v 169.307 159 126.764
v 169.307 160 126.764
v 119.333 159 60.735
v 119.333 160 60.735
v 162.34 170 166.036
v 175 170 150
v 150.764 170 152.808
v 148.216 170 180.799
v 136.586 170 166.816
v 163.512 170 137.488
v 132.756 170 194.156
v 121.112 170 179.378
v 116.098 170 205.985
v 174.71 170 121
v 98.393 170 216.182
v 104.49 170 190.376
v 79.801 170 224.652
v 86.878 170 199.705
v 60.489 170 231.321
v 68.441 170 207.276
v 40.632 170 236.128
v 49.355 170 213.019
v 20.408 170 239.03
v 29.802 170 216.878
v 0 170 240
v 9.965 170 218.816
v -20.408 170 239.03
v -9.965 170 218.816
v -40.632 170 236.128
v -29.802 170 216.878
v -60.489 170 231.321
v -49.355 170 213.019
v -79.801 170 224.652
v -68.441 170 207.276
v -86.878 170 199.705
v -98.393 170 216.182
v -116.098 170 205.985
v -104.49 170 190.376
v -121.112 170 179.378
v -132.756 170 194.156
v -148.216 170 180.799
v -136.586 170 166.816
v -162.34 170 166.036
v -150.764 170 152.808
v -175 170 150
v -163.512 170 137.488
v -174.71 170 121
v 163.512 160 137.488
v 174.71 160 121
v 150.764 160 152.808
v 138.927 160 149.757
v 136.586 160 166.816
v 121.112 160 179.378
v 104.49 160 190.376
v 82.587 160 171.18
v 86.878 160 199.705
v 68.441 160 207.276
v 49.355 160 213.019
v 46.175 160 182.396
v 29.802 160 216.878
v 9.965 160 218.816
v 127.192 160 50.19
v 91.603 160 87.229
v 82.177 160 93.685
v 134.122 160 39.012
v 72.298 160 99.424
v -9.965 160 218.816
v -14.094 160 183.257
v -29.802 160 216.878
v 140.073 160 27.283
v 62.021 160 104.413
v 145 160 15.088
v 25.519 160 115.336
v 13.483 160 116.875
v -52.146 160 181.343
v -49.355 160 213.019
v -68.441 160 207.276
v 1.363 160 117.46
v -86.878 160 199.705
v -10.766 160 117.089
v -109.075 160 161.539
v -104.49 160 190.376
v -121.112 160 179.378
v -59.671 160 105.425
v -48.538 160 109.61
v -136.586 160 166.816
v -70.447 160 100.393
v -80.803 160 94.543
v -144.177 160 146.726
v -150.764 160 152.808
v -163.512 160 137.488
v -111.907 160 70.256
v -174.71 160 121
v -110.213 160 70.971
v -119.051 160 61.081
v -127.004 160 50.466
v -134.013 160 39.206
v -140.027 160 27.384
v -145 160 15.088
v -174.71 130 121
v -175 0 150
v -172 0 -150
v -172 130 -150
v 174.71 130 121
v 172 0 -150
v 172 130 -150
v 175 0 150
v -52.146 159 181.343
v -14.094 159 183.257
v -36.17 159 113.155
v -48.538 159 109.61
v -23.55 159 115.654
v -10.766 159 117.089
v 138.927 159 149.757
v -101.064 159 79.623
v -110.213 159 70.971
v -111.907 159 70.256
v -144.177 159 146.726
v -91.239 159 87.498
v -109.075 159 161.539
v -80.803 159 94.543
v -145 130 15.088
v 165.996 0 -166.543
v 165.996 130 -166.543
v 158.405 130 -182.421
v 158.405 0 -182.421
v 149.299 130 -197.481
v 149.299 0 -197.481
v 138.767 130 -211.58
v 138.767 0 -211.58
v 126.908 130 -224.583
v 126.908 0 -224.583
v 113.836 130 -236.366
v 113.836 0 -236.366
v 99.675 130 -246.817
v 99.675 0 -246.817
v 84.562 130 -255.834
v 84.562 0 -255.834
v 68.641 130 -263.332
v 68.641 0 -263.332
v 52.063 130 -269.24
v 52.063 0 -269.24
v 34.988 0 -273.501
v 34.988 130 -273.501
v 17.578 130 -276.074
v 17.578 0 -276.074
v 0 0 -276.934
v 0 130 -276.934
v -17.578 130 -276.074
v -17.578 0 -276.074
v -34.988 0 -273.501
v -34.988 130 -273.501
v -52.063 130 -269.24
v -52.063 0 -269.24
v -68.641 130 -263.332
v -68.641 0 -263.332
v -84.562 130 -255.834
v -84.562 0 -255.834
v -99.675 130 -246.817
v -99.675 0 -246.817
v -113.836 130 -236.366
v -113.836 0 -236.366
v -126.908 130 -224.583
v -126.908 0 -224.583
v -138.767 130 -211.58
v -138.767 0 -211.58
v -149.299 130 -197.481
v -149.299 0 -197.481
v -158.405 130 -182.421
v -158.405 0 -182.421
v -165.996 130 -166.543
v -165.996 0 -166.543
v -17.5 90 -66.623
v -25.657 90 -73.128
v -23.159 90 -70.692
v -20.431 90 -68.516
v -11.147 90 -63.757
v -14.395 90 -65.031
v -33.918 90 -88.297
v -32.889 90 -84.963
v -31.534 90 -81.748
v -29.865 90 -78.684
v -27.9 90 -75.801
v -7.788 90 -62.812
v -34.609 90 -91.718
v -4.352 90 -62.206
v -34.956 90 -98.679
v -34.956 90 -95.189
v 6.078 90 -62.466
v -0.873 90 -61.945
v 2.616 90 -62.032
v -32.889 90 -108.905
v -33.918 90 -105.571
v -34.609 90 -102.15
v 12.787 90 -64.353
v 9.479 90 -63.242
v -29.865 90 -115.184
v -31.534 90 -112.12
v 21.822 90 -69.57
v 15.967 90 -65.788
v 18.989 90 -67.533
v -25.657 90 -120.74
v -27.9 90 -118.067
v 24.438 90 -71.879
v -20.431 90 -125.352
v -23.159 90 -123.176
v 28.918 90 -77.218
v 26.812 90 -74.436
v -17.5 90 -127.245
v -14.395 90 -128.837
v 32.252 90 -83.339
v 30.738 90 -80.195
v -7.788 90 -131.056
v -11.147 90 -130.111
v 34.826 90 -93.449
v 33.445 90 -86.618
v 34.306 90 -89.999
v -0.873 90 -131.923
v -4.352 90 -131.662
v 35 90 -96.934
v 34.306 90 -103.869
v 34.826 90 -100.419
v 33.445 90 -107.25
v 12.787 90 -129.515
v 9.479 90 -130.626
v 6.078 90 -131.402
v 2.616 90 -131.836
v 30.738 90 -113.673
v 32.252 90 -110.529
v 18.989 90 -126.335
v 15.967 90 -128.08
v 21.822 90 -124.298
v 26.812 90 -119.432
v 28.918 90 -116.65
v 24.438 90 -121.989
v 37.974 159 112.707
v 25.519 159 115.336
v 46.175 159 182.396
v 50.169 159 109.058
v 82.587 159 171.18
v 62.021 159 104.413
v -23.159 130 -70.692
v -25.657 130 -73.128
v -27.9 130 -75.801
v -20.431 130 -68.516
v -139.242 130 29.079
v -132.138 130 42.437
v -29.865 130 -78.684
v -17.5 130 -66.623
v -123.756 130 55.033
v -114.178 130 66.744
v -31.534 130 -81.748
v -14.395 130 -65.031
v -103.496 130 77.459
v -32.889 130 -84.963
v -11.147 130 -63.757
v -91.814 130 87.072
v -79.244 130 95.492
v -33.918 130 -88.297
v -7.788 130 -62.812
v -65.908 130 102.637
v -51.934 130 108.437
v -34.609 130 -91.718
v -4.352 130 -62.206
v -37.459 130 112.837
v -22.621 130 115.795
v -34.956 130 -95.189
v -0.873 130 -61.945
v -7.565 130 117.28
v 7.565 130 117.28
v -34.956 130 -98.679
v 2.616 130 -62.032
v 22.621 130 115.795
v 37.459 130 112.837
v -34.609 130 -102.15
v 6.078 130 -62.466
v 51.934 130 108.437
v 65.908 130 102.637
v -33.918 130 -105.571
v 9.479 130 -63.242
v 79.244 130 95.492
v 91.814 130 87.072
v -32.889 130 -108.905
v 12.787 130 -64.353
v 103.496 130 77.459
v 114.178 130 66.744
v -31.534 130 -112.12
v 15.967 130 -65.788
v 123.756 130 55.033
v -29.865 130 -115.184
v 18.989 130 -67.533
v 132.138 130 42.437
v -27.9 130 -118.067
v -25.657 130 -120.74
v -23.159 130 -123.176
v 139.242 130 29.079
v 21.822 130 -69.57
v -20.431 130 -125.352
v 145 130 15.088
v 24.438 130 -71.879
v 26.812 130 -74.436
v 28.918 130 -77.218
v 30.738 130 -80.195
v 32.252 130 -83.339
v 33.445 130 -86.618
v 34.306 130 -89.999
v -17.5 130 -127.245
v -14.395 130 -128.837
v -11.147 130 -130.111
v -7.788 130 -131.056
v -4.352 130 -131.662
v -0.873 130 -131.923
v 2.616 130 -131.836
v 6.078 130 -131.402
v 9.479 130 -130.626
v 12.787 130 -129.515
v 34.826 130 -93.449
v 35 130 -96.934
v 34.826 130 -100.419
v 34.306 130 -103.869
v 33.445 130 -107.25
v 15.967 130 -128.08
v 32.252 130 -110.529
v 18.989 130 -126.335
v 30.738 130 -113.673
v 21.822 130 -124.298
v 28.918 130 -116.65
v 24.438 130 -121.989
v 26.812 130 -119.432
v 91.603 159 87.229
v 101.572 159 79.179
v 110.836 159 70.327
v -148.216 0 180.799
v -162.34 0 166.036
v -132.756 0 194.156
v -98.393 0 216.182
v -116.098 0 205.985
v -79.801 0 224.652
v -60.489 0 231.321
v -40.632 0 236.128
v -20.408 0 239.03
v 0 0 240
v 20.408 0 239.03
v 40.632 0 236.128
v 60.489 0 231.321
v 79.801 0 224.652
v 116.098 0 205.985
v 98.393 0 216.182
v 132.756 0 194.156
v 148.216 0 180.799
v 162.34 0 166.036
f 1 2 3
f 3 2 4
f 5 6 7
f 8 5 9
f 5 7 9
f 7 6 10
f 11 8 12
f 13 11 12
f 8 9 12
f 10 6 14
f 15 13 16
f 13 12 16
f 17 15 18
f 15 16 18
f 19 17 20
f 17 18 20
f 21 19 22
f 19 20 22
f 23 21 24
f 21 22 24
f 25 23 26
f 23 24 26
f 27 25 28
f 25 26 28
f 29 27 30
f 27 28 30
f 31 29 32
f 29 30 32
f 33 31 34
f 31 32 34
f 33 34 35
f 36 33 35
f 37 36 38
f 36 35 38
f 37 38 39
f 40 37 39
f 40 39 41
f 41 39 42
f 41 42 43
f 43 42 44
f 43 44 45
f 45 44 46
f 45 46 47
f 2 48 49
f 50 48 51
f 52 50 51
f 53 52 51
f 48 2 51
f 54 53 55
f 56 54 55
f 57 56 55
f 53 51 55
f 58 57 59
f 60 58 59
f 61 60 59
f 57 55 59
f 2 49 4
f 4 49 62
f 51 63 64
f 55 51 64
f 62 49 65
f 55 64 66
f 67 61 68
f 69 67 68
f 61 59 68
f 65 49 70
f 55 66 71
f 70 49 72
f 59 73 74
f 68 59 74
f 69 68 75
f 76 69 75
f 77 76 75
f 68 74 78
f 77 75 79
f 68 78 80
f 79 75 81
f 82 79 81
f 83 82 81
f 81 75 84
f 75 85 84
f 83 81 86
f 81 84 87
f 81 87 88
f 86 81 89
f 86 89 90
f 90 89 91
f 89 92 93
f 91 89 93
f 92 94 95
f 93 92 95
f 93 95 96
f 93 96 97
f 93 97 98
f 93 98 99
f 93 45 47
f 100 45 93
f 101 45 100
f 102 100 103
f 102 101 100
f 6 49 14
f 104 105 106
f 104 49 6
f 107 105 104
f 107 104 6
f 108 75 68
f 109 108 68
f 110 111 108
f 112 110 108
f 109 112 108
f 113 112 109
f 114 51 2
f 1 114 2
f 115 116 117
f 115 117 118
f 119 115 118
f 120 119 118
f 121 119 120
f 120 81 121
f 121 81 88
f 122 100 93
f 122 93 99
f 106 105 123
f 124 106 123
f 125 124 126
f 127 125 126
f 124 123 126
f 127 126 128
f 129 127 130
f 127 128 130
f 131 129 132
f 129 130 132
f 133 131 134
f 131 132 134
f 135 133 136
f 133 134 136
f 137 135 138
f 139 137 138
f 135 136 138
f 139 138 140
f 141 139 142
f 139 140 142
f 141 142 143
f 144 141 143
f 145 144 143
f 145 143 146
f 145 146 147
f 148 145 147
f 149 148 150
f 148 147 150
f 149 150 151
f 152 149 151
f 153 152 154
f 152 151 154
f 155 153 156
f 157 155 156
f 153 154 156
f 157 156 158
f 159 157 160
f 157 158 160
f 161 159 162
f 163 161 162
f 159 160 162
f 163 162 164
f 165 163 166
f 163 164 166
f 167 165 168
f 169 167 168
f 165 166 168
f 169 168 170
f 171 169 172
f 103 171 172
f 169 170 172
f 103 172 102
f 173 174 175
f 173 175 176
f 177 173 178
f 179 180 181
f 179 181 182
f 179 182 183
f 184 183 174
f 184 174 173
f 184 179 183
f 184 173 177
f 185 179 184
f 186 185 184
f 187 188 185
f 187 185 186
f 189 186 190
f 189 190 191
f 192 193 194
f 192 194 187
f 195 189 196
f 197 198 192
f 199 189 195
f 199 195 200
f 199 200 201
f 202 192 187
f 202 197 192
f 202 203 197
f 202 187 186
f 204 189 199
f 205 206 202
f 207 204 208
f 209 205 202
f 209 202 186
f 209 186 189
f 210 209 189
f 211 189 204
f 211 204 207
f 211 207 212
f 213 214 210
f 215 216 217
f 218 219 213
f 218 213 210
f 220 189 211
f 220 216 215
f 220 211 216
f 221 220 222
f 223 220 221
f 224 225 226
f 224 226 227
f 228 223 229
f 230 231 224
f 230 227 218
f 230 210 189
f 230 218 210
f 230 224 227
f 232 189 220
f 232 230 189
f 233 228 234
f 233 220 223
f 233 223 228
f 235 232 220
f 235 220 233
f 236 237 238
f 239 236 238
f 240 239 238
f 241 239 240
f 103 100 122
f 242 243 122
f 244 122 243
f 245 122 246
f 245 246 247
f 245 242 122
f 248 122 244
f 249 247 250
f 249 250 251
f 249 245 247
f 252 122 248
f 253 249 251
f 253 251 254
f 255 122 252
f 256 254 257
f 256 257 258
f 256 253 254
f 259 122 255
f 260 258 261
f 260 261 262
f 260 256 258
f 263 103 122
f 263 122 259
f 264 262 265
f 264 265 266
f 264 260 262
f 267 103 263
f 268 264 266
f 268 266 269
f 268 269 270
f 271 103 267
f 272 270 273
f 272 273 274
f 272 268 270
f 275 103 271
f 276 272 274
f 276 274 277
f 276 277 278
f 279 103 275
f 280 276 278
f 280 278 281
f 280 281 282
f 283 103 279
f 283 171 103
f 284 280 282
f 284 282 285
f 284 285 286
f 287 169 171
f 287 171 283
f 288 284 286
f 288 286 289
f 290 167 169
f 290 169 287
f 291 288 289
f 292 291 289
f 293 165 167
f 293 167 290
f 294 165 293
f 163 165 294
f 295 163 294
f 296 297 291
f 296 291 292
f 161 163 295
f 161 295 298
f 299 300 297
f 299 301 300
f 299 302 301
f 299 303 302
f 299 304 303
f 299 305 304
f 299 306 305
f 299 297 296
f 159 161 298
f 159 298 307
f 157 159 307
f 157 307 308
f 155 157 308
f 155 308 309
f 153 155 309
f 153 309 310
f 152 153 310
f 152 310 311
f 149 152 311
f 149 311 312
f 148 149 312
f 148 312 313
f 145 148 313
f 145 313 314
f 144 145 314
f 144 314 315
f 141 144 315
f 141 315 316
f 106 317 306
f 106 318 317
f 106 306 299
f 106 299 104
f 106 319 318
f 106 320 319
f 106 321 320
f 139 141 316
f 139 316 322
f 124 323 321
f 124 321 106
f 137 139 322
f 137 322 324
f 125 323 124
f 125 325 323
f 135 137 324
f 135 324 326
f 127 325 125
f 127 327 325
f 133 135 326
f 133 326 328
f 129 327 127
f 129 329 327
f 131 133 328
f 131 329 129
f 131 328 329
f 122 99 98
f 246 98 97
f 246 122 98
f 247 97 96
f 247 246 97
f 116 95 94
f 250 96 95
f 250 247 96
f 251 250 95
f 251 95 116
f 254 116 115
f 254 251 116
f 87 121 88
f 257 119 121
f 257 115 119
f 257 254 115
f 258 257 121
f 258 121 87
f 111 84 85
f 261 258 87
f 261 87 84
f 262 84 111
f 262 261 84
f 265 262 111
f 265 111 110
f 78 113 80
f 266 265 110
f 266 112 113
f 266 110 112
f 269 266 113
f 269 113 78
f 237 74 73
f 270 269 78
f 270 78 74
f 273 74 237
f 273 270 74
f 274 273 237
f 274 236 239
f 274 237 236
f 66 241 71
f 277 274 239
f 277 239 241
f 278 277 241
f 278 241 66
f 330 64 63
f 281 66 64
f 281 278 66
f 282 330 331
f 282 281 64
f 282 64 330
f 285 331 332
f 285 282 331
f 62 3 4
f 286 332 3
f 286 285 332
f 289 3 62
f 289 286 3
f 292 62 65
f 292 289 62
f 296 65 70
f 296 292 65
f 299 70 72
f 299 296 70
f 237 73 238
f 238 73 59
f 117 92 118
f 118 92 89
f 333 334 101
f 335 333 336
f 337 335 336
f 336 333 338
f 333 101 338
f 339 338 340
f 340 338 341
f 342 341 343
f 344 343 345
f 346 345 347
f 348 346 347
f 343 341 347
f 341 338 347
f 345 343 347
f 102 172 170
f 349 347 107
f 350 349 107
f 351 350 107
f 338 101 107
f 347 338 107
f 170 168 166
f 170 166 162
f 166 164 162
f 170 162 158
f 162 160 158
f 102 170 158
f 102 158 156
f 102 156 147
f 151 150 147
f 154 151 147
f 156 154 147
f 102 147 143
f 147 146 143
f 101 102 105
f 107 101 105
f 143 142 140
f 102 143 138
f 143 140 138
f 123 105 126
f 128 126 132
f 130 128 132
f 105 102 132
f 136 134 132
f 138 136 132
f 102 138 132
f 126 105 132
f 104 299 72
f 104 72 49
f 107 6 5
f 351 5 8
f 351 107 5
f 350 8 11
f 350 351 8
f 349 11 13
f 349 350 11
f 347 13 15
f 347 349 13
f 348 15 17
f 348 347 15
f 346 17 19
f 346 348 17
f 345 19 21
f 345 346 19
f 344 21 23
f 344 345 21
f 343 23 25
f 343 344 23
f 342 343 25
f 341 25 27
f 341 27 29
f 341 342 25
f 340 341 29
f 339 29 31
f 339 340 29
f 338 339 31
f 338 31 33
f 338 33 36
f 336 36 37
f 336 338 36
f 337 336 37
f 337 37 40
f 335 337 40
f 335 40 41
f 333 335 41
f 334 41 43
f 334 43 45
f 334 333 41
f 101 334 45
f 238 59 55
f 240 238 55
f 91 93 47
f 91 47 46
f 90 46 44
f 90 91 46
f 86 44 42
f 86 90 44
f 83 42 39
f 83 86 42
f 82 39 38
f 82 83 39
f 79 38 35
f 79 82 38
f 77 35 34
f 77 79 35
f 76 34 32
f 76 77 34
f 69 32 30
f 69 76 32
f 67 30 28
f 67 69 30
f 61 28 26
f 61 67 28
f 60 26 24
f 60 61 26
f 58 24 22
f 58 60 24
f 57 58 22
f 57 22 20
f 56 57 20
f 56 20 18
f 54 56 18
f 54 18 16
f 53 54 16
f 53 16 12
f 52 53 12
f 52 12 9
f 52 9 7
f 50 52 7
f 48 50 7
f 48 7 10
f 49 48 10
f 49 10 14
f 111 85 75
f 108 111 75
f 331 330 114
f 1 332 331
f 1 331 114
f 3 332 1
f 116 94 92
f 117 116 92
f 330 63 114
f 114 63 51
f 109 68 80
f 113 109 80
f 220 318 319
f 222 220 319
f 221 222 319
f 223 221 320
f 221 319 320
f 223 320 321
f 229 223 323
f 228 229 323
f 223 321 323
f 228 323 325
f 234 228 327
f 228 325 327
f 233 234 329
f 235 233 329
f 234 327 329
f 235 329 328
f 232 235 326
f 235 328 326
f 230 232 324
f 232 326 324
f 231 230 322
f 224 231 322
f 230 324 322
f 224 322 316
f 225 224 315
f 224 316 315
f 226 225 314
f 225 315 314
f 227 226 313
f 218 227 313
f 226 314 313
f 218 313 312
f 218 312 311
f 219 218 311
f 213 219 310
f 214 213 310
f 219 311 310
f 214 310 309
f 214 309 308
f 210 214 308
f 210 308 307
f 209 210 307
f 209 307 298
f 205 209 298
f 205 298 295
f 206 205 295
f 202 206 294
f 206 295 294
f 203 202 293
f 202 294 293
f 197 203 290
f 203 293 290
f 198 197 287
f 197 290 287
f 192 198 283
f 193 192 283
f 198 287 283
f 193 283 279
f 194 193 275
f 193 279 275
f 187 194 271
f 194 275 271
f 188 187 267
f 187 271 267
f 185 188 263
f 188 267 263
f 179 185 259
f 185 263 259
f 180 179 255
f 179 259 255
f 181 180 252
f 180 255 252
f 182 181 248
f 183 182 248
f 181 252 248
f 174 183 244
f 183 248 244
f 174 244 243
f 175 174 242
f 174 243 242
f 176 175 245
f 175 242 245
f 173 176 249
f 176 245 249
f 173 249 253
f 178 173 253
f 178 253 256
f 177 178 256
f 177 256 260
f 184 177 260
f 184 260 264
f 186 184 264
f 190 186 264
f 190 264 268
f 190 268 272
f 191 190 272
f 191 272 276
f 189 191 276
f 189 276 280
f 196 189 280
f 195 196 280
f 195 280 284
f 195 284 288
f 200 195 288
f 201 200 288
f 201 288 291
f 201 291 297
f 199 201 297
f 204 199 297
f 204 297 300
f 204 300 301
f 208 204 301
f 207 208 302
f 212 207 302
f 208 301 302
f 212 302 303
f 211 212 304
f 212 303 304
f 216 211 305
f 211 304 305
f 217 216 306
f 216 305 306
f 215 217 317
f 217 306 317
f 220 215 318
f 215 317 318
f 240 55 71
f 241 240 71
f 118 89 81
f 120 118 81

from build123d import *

# Parameters (mm, degrees)
BOSS_EXTRUDE1_DEPTH = 130
BOSS_EXTRUDE2_DEPTH = 40
SKETCH4_R           = 35
CUT_EXTRUDE1_DEPTH  = 40
BOSS_EXTRUDE3_DEPTH = 30
CUT_EXTRUDE2_DEPTH  = 1
CIRPATTERN1_COUNT   = 4
CIRPATTERN1_ANGLE   = 60


with BuildPart() as part:
    # Sketch2 → Boss-Extrude1 (new body)
    with BuildSketch(Plane(origin=(0, 0, 0), x_dir=(1, 0, 0), z_dir=(0, 1, 0))):
        with BuildLine():
            Line((-172, 150), (-175, -150))
            ThreePointArc((-175, -150), (0, -240), (175, -150))
            Line((175, -150), (172, 150))
            ThreePointArc((172, 150), (0, 276.934003354), (-172, 150))
        make_face()
    extrude(amount=BOSS_EXTRUDE1_DEPTH)

    # Sketch3 → Boss-Extrude2 (add)
    with BuildSketch(Plane(origin=(0, 130, 0), x_dir=(1, 0, 0), z_dir=(0, 1, 0))):
        with BuildLine():
            Line((-175, -150), (-174.71, -121))
            ThreePointArc((-174.71, -121), (0, -219.05898872), (174.71, -121))
            Line((174.71, -121), (175, -150))
            ThreePointArc((175, -150), (0, -240), (-175, -150))
        make_face()
    extrude(amount=BOSS_EXTRUDE2_DEPTH)

    # Sketch4 → Cut-Extrude1 (cut)
    with BuildSketch(Plane(origin=(0, 130, 0), x_dir=(1, 0, 0), z_dir=(0, 1, 0))):
        with Locations((0, 96.934003354)):
            Circle(SKETCH4_R)
    extrude(amount=-CUT_EXTRUDE1_DEPTH, mode=Mode.SUBTRACT)

    # Sketch5 → Boss-Extrude3 (add)
    with BuildSketch(Plane(origin=(0, 130, 0), x_dir=(1, 0, 0), z_dir=(0, 1, 0))):
        with BuildLine():
            Line((-174.71, -121), (-145, -15.088169216))
            ThreePointArc((-145, -15.088169216), (0, -117.466388714), (145, -15.088169216))
            Line((145, -15.088169216), (174.71, -121))
            ThreePointArc((174.71, -121), (0, -219.05898872), (-174.71, -121))
        make_face()
    extrude(amount=BOSS_EXTRUDE3_DEPTH)

    # Sketch6 → Cut-Extrude2 (cut)
    with BuildSketch(Plane(origin=(0, 160, 0), x_dir=(1, 0, 0), z_dir=(0, 1, 0))):
        Polygon((169.306747394, -126.764048286), (119.216917014, -60.582412673), (88.83715416, -83.575455293), (138.92698454, -149.757090907), align=None)
    cut_extrude2 = extrude(amount=-CUT_EXTRUDE2_DEPTH, mode=Mode.SUBTRACT)

    # CirPattern1: Cut-Extrude2 ×4 about axis
    cirpattern1_axis = Axis((0, 0, -96.934003354), (0, -1, 0))
    for i in range(1, CIRPATTERN1_COUNT):
        add(cut_extrude2.rotate(cirpattern1_axis, i * CIRPATTERN1_ANGLE / (CIRPATTERN1_COUNT - 1)), mode=Mode.SUBTRACT)


solid = part.part
